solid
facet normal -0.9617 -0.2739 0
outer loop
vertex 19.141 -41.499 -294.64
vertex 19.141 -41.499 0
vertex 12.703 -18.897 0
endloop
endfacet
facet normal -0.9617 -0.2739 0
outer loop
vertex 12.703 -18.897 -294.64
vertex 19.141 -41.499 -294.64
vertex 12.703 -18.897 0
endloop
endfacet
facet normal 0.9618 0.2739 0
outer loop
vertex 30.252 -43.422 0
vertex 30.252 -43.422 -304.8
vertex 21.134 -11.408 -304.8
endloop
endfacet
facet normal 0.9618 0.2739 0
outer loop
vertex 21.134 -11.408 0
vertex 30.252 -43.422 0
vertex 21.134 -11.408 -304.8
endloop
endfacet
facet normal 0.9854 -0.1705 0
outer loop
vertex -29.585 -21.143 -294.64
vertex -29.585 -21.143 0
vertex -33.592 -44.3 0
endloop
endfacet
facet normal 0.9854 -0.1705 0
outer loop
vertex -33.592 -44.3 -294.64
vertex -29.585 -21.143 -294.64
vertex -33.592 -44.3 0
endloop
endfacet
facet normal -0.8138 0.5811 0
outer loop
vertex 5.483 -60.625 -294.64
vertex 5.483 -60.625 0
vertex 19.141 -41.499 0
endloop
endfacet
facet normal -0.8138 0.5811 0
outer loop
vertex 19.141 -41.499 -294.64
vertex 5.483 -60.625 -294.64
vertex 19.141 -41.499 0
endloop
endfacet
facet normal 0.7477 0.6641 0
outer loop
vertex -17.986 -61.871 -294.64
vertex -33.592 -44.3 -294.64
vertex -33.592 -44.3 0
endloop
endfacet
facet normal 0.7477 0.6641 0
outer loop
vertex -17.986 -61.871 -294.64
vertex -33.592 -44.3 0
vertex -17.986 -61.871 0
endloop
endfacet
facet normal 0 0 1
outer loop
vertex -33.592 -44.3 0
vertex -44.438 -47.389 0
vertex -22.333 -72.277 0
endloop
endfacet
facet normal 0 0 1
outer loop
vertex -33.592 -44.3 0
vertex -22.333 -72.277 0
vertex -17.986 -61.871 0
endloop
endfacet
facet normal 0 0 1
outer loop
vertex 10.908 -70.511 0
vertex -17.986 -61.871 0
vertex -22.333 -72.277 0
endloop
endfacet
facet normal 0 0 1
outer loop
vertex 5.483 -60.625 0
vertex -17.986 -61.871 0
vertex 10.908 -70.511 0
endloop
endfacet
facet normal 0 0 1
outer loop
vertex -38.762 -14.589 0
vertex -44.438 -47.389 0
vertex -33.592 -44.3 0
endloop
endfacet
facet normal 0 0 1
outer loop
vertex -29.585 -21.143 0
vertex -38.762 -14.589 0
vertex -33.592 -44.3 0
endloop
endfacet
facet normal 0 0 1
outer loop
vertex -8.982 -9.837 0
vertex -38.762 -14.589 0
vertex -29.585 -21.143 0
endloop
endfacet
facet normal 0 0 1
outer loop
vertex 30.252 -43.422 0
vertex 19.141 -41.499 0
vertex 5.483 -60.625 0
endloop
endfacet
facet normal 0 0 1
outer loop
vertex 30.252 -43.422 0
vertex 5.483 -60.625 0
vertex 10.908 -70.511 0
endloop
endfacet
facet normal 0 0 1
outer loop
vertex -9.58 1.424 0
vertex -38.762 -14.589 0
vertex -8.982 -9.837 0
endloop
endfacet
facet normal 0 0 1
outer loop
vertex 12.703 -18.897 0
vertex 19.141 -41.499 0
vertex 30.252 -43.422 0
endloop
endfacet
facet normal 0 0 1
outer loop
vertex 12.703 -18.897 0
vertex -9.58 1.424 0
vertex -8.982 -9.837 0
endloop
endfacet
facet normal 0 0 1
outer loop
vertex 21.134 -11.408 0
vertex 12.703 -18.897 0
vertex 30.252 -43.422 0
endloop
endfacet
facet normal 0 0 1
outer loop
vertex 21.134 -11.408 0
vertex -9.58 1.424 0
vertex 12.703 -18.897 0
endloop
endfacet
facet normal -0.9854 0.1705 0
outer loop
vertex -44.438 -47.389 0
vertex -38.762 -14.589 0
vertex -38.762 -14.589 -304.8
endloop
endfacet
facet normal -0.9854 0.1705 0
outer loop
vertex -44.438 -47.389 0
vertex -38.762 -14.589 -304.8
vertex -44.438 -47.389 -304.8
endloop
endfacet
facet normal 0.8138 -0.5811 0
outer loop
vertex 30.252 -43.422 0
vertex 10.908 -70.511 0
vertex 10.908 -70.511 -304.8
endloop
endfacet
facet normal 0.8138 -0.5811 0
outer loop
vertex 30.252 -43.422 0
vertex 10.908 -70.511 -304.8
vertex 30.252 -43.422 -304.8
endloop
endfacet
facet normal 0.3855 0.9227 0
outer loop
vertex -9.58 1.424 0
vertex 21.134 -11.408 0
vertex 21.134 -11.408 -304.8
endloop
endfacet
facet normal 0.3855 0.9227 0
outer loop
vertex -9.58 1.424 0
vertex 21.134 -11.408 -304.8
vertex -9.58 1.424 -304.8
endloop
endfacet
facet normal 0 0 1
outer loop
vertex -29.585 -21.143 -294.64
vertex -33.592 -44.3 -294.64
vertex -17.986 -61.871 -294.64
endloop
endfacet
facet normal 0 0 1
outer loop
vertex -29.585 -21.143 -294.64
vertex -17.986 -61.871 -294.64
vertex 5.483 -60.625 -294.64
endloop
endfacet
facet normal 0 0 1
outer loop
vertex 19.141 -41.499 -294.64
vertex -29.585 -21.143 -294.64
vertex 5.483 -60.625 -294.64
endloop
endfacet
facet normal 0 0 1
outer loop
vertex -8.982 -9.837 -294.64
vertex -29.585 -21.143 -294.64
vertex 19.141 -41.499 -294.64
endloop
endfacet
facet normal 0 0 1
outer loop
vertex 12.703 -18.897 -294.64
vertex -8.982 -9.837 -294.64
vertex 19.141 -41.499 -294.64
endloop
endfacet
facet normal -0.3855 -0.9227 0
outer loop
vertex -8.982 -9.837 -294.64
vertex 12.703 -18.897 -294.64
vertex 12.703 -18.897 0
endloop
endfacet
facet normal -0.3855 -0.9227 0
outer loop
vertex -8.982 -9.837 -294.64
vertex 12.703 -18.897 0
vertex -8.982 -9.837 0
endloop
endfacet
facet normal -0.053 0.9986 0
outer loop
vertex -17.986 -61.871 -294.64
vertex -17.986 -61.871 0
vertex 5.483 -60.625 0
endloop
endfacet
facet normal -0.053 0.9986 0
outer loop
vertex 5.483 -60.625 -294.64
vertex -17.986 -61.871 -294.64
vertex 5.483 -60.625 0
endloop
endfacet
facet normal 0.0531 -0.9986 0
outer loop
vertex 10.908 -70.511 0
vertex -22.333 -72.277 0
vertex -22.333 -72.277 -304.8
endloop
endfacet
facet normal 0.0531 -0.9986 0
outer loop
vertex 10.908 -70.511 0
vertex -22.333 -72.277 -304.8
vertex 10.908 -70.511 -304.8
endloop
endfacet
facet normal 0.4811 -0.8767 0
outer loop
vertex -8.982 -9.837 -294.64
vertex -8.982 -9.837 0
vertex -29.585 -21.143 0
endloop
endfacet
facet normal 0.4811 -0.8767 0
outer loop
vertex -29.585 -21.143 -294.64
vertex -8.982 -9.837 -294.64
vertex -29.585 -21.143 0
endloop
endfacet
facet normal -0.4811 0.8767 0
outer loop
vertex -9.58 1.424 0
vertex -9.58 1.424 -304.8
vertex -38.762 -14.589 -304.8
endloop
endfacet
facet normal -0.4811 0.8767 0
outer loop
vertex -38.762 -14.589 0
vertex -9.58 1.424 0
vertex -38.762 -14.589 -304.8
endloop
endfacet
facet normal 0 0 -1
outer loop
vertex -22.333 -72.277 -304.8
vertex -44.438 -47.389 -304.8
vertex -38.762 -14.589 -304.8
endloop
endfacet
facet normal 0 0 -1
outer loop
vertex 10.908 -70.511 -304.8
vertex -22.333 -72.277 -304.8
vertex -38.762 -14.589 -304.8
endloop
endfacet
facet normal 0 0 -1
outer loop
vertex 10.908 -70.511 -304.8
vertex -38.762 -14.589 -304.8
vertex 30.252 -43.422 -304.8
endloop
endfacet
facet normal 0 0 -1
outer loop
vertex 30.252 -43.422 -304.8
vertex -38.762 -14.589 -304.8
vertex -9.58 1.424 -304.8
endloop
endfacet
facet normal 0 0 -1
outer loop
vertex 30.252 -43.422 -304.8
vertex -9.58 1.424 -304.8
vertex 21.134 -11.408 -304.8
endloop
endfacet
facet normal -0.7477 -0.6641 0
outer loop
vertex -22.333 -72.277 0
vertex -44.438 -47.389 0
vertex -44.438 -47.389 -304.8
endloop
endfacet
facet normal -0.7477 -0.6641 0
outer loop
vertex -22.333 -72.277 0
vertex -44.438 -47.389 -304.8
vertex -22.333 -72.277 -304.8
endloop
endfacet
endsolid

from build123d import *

# Parameters (mm, degrees)
F1_DEPTH = 304.8
F2_T     = -10.16


# Not quite as in the source:
# - a length typed as a fraction of an inch, garbled in the dataset ("3 / 203.2 mm" for 3/8 in), is restored


with BuildPart() as f1:
    # F0 (on Top) → F1 (new body)
    with BuildSketch(Plane.XY):
        Polygon((-9.5800449151, 1.4236958328), (-38.7624735933, -14.5894044641), (-44.4378743236, -47.3891506708), (-22.332554599, -72.2766649008), (10.9077289615, -70.5111413261), (30.2523648586, -43.4220552086), (21.1344477032, -11.4080409114), align=None)
    extrude(amount=-F1_DEPTH)

    # F2
    f2_openings = [f1.faces().sort_by_distance(p)[0] for p in [
        (-7.545487, -36.881823, 0),
    ]]
    offset(amount=F2_T, openings=f2_openings)


solid = f1.part
